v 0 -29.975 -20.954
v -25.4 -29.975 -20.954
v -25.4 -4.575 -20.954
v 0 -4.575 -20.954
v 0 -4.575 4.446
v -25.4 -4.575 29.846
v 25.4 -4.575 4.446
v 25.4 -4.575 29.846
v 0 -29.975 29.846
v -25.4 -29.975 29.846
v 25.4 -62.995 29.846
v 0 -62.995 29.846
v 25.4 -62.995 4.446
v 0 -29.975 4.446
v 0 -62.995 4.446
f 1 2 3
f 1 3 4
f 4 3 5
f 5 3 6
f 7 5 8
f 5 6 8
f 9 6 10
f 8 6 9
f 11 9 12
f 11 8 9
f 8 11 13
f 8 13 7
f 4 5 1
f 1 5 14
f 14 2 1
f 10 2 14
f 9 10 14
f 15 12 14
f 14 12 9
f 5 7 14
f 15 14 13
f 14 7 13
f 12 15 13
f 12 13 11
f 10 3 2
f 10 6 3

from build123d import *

# Parameters (mm, degrees)
F0_W     = 58.42
F0_H     = 25.4
F1_DEPTH = 25.4
F2_W     = 25.4
F2_H     = 25.4
F3_DEPTH = 25.4
F4_W     = 25.4
F4_H     = 25.4
F5_DEPTH = 25.4


with BuildPart() as f1:
    # F0 (on Right) → F1 (new body)
    with BuildSketch(Plane.YZ):
        with Locations((-33.78506, 17.145792)):
            Rectangle(F0_W, F0_H)
    extrude(amount=F1_DEPTH)

    # F2 (on face) → F3 (join)
    with BuildSketch(Plane(origin=(0, 0, 0), x_dir=(0, -1, 0), z_dir=(-1, 0, 0))):
        with Locations((17.27506, 17.145792)):
            Rectangle(F2_W, F2_H)
    extrude(amount=F3_DEPTH)

    # F4 (on face) → F5 (join)
    with BuildSketch(Plane(origin=(0, 0, 4.445792), x_dir=(1, 0, 0), z_dir=(0, 0, -1))):
        with Locations((-12.7, 17.27506)):
            Rectangle(F4_W, F4_H)
    extrude(amount=F5_DEPTH)


solid = f1.part
